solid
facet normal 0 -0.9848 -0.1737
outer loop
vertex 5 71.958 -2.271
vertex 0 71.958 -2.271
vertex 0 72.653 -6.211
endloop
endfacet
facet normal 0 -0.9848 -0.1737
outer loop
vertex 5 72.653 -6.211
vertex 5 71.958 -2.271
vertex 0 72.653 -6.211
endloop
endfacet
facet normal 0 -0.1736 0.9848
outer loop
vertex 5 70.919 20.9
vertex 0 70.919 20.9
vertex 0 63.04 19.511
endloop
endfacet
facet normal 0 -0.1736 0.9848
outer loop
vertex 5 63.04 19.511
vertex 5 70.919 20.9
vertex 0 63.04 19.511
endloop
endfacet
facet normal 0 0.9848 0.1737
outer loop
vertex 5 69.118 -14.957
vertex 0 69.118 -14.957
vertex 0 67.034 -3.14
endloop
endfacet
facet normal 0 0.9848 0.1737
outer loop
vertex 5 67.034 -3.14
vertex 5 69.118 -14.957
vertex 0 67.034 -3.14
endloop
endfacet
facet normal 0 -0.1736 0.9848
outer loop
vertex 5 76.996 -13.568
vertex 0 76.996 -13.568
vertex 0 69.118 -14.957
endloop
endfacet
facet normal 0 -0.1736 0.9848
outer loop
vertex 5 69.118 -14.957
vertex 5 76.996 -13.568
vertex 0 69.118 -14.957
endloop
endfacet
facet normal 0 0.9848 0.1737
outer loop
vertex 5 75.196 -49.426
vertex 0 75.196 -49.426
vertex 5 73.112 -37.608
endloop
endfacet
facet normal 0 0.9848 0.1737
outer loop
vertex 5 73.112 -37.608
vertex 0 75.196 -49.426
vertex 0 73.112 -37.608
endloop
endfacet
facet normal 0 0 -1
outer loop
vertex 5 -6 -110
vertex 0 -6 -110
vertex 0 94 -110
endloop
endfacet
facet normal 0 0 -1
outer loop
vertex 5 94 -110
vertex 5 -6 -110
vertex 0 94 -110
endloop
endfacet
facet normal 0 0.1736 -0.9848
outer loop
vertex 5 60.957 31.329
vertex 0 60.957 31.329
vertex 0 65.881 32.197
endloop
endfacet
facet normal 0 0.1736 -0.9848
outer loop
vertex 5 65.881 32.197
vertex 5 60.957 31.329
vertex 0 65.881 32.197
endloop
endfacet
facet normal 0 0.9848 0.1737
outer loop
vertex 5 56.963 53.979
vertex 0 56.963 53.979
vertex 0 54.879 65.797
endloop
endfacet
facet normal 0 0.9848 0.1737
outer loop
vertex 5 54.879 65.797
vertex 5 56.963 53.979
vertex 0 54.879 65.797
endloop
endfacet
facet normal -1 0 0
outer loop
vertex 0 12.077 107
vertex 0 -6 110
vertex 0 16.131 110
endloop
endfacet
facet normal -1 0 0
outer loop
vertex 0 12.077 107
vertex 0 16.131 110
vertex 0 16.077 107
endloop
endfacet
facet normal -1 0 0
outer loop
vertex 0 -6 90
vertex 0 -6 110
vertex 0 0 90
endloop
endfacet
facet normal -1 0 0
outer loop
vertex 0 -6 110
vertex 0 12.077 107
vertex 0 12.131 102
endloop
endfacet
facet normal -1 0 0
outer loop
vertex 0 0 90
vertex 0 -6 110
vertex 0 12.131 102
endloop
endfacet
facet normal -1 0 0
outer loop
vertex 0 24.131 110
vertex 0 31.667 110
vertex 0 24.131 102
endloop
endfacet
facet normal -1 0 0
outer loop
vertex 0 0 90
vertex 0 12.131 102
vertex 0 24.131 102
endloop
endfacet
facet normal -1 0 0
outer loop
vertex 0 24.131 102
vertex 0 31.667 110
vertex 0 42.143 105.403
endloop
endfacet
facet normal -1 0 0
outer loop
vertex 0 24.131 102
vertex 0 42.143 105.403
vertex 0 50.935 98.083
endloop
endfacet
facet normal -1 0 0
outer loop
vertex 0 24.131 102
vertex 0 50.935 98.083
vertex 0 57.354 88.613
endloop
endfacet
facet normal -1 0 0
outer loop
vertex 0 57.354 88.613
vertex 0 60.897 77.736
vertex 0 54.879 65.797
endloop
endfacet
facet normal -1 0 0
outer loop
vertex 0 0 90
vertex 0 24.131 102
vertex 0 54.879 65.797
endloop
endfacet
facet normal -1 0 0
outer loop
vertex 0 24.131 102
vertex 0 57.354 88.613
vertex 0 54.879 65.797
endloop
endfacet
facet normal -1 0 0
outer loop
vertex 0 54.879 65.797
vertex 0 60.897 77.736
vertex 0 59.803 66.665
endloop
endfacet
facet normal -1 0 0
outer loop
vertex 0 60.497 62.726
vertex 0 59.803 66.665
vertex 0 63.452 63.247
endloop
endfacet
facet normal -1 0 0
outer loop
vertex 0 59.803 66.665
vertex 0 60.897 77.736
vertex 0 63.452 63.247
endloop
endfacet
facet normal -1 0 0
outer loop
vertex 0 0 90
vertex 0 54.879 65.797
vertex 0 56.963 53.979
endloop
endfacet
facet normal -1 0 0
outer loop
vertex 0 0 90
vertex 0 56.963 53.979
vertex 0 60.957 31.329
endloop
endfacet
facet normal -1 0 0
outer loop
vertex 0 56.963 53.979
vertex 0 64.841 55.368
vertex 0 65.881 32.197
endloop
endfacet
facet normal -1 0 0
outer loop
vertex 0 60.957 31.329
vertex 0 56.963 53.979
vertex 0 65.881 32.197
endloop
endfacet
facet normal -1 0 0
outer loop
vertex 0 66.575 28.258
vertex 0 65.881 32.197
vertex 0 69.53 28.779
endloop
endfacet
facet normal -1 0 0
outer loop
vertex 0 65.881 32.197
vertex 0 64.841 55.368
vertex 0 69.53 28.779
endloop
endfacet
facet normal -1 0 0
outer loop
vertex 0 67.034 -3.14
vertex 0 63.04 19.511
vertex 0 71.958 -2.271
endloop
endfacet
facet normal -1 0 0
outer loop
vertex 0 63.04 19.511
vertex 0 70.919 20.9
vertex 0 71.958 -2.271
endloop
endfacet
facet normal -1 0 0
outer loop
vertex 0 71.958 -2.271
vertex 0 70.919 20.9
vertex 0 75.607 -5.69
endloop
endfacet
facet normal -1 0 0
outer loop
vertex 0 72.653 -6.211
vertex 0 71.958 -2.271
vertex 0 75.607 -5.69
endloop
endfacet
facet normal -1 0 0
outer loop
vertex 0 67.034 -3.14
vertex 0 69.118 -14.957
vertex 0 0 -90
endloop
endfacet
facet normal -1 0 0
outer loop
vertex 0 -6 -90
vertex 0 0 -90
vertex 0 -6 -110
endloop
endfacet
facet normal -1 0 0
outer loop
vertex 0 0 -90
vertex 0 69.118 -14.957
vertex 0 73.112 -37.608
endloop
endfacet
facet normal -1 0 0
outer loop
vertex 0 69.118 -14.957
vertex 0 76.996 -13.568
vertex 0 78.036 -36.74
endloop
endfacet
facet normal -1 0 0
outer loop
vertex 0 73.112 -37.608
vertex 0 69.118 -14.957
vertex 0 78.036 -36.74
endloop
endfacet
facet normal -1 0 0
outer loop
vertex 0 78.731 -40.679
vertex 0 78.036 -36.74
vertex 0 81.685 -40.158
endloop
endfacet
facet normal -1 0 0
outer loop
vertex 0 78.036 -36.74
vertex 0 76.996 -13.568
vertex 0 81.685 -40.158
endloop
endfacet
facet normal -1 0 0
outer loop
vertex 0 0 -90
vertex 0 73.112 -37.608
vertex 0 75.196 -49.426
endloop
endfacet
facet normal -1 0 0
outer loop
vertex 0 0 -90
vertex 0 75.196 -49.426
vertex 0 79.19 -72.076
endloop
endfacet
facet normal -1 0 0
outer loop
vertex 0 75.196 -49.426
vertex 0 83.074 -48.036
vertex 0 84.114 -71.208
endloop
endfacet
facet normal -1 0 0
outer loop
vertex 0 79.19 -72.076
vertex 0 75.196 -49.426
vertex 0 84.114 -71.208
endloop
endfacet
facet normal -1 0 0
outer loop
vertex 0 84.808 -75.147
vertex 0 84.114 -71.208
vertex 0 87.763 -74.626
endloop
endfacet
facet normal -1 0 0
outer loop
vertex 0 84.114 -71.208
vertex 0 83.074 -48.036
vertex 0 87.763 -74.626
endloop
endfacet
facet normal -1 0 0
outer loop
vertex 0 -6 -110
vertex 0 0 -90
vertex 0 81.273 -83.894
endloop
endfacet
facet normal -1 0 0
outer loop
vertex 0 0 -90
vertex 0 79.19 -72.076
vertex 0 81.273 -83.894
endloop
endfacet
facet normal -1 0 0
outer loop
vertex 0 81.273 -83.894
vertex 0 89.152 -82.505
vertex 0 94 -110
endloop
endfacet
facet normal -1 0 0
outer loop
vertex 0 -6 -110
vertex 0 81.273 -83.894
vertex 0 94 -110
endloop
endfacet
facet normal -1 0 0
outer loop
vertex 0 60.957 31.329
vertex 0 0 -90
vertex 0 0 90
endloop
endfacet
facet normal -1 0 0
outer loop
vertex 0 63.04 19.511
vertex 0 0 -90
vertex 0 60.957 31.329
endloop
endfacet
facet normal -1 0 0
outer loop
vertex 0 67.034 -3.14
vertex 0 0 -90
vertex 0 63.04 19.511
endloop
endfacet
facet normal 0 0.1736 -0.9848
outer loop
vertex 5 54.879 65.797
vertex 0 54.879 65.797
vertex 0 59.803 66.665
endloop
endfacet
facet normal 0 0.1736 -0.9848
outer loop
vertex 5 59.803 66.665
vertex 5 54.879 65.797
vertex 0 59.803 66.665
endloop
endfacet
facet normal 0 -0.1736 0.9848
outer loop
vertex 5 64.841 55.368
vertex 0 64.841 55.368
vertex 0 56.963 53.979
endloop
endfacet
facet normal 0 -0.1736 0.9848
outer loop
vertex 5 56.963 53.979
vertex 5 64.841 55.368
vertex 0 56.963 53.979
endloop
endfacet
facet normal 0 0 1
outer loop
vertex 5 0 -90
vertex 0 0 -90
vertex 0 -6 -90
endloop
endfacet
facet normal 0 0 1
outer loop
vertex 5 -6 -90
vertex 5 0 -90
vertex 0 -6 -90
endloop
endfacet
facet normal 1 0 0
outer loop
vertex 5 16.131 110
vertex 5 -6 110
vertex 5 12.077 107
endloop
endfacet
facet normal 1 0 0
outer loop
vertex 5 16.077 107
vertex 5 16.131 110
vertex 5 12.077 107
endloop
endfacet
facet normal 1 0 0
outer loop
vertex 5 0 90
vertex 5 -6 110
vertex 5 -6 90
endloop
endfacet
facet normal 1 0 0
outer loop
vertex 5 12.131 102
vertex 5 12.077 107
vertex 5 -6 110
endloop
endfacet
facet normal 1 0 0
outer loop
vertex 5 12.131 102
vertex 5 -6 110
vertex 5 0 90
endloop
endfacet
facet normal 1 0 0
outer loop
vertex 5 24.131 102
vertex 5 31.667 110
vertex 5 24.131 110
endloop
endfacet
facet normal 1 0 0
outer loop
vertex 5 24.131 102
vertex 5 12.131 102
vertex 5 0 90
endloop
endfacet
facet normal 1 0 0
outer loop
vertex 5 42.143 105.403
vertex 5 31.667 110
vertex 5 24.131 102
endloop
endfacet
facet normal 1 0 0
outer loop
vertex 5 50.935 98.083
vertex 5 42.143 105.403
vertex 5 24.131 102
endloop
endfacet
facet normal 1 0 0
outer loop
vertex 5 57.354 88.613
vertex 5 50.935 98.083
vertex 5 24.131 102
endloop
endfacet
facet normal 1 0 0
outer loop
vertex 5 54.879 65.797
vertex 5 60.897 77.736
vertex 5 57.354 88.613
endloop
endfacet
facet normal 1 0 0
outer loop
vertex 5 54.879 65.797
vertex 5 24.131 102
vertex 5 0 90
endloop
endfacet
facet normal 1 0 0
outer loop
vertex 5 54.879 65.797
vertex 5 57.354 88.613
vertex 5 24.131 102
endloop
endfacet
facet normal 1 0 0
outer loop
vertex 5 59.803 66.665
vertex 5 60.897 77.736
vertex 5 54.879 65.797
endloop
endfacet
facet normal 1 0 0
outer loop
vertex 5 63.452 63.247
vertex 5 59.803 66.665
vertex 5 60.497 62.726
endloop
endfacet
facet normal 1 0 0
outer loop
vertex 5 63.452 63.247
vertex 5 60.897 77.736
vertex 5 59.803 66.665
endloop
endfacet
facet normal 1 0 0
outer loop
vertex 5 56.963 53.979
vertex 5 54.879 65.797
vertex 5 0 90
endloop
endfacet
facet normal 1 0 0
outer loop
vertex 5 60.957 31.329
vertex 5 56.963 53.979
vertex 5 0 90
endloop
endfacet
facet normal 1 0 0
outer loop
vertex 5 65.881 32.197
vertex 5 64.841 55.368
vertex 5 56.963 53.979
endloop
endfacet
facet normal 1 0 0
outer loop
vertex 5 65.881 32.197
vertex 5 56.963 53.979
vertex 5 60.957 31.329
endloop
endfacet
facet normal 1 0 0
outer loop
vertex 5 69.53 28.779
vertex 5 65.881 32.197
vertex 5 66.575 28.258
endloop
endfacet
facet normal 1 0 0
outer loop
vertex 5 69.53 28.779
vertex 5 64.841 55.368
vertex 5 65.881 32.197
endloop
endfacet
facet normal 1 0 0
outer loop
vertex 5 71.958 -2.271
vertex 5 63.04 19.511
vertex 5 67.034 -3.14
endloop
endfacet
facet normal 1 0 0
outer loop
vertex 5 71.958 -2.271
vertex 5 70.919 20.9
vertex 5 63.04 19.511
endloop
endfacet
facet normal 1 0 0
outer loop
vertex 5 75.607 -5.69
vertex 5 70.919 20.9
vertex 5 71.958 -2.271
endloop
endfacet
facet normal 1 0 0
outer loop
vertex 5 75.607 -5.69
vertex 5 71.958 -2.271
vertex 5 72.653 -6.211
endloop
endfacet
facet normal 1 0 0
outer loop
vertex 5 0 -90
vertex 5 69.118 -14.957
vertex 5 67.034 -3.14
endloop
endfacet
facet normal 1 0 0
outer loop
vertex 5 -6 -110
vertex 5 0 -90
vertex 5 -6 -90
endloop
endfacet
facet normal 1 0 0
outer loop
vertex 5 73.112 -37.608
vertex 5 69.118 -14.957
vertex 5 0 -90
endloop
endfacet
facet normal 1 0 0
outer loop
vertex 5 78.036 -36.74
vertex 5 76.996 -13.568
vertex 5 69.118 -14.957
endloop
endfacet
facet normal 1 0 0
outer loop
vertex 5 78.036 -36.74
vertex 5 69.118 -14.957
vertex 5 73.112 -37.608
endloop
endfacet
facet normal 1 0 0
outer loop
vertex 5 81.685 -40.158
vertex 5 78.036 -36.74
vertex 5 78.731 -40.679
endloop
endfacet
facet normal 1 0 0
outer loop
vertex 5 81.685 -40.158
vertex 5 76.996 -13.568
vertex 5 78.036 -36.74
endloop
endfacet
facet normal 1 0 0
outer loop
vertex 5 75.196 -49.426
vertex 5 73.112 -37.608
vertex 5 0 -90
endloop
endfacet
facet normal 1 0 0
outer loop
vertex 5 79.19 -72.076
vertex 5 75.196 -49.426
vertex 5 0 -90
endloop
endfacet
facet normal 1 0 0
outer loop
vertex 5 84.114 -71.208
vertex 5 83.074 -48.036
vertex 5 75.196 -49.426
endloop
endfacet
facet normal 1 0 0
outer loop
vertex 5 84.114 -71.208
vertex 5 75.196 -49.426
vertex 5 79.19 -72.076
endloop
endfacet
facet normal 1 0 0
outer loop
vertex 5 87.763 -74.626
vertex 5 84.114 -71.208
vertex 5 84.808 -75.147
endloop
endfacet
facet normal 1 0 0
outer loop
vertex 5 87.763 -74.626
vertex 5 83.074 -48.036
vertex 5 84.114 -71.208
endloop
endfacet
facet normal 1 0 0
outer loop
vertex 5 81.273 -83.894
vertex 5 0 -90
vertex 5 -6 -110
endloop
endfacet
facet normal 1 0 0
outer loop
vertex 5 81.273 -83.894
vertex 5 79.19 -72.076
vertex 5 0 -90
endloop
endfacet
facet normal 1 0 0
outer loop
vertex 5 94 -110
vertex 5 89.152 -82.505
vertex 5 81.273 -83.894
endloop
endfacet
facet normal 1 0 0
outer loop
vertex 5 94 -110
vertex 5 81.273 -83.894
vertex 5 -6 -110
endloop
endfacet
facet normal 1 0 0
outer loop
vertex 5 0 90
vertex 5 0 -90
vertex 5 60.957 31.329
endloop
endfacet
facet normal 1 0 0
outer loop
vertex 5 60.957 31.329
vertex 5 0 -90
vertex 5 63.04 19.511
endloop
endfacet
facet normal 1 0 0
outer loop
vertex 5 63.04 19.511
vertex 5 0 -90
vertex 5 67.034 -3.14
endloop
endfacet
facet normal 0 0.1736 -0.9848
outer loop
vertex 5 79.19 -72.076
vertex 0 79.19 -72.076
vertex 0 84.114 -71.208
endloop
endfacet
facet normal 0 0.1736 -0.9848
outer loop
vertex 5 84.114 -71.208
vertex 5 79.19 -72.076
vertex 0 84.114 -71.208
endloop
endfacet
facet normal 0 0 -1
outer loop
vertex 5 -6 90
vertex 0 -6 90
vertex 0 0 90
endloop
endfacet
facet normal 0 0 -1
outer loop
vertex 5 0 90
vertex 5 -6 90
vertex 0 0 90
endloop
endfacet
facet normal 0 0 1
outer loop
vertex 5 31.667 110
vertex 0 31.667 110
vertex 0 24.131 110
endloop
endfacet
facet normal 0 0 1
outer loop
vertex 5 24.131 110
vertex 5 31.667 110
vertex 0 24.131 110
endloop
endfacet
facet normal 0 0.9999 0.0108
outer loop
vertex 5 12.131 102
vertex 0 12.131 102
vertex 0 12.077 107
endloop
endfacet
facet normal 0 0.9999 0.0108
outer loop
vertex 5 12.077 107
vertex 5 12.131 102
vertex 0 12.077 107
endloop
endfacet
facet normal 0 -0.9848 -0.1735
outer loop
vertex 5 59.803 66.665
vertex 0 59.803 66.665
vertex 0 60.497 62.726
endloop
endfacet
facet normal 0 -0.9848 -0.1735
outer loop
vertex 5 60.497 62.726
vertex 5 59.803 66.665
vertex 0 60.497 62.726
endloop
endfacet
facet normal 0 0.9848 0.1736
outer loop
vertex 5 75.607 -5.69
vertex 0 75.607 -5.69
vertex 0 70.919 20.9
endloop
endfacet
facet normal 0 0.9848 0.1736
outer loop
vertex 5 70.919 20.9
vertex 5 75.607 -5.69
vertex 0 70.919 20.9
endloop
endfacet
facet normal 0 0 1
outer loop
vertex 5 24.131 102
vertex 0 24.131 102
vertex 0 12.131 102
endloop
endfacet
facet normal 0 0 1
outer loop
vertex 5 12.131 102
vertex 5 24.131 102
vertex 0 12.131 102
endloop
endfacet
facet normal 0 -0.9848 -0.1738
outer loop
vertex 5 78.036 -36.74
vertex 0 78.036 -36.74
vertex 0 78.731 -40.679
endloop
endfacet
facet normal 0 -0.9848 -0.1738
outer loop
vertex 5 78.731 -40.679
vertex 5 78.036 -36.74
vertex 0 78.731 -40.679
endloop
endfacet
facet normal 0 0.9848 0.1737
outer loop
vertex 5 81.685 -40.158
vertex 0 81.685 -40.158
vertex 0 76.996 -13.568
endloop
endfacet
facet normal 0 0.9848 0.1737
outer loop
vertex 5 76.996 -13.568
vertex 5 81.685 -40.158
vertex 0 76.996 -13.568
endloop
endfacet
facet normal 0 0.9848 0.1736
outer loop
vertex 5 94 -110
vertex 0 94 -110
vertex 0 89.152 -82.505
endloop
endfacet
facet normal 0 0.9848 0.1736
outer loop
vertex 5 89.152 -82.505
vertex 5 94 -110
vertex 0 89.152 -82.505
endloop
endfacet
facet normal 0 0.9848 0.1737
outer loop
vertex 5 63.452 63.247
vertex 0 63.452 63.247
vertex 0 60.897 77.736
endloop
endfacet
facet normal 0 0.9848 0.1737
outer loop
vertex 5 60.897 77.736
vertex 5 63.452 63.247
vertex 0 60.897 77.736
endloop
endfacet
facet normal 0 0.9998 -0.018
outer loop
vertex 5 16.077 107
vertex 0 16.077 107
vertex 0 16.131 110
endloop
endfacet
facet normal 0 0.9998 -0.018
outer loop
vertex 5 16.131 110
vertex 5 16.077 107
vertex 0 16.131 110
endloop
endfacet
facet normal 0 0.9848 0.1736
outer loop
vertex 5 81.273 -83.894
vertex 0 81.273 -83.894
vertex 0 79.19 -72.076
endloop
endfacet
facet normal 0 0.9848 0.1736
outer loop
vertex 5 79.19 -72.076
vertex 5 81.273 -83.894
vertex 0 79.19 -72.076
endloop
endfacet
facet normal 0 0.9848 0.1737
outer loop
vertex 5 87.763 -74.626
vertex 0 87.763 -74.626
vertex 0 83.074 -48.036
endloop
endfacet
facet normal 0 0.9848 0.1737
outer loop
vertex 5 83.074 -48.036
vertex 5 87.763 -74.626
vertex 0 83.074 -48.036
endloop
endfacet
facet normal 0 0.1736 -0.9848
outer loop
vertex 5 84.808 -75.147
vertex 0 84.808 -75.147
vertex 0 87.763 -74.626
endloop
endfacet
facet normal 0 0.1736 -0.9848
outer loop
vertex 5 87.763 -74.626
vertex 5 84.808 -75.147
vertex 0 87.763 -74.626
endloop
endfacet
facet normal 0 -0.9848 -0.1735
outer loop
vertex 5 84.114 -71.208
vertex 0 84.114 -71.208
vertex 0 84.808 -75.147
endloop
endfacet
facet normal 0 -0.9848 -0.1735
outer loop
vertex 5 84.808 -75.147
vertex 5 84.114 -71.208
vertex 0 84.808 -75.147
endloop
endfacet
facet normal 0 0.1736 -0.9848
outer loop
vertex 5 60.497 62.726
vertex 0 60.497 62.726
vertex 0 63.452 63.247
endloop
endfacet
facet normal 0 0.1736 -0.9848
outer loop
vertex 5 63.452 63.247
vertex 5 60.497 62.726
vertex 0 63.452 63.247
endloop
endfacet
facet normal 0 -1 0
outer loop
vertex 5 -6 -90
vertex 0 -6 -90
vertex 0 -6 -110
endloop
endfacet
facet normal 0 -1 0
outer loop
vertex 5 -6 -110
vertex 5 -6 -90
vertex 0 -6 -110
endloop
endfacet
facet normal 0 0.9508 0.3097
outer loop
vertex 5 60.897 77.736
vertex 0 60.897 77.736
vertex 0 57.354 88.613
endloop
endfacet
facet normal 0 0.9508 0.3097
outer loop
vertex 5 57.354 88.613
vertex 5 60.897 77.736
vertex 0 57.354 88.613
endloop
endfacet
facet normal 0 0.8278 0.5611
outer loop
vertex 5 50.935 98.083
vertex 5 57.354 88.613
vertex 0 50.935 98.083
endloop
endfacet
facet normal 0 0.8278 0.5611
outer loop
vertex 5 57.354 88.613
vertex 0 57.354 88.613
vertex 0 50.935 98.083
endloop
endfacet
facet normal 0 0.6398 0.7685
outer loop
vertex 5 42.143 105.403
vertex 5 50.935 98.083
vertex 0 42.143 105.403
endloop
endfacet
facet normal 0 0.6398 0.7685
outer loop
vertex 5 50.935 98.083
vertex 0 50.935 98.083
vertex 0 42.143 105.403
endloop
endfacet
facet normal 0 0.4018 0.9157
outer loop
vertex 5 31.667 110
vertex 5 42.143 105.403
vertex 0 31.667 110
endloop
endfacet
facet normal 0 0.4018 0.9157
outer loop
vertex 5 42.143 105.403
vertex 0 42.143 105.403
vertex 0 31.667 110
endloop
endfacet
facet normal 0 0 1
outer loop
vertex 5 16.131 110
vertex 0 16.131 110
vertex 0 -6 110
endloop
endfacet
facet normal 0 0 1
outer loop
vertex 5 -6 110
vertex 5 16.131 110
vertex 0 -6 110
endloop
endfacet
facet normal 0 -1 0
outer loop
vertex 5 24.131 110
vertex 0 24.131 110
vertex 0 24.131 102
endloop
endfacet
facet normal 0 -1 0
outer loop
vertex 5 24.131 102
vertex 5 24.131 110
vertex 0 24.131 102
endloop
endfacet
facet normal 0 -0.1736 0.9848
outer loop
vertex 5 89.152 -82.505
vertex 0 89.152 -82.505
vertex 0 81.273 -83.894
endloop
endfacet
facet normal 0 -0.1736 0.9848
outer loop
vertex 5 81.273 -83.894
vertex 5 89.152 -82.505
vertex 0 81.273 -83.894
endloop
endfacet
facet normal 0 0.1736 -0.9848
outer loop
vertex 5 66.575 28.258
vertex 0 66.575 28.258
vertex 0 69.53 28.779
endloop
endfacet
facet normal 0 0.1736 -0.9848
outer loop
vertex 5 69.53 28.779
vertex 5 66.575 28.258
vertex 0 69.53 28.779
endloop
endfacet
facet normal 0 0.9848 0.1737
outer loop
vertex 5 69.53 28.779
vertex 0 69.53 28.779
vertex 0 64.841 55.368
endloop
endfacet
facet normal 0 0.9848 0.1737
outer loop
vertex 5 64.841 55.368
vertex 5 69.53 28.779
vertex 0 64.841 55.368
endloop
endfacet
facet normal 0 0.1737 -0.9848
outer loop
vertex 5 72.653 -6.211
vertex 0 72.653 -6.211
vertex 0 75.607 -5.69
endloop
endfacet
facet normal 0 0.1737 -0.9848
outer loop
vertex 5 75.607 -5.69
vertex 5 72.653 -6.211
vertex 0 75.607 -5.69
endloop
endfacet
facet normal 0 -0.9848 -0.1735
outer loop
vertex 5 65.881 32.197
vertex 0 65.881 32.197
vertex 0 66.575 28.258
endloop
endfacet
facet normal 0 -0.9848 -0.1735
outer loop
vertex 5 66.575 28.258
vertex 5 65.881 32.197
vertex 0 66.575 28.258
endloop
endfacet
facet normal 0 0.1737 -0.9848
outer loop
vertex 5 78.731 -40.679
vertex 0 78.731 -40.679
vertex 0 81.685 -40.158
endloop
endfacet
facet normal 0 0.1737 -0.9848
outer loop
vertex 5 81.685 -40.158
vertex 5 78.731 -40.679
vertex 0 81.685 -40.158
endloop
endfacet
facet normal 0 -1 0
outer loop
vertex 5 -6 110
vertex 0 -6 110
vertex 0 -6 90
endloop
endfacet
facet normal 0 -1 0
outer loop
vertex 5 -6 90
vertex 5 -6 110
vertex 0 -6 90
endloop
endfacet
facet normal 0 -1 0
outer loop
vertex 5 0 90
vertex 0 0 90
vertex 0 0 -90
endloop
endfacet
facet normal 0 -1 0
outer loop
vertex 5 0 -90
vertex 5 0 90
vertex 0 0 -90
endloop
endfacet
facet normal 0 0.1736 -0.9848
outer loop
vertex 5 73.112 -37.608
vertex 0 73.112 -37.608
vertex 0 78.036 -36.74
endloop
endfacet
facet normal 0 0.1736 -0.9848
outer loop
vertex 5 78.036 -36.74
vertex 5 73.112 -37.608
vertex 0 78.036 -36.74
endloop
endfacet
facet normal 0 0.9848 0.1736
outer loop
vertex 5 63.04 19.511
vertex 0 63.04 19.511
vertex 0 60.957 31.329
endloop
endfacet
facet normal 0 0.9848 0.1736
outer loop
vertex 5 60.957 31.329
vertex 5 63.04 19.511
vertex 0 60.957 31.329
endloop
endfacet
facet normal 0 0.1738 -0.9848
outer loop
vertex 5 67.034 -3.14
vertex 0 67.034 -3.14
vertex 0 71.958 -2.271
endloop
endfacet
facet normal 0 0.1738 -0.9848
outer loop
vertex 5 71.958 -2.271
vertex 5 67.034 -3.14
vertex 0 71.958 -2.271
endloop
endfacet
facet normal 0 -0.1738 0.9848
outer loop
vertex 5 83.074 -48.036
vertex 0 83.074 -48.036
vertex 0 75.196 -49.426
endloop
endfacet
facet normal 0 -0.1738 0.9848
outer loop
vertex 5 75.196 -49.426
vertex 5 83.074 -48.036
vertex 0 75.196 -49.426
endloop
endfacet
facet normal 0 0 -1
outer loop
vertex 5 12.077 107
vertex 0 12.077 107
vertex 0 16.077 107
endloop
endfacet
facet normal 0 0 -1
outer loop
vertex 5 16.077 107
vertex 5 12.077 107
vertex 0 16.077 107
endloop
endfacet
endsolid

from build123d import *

# Parameters (mm, degrees)
BOSS_EXTRUDE1_DEPTH = 5


with BuildPart() as part:
    # Sketch1 → Boss-Extrude1 (new body)
    with BuildSketch(Plane(origin=(0, 0, 0), x_dir=(0, 0, -1), z_dir=(1, 0, 0))):
        with BuildLine():
            Line((-110, -6), (-90, -6))
            Line((-90, -6), (-90, 0))
            Line((-90, 0), (90, 0))
            Line((90, 0), (90, -6))
            Line((90, -6), (110, -6))
            Line((110, -6), (110, 94))
            Line((110, 94), (82.504621365, 89.151822902))
            Line((82.504621365, 89.151822902), (83.893806786, 81.273360878))
            Line((83.893806786, 81.273360878), (72.07611375, 79.189582746))
            Line((72.07611375, 79.189582746), (71.207872862, 84.113621511))
            Line((71.207872862, 84.113621511), (75.147103874, 84.808214222))
            Line((75.147103874, 84.808214222), (74.626159341, 87.762637481))
            Line((74.626159341, 87.762637481), (48.03635001, 83.074136684))
            Line((48.03635001, 83.074136684), (49.425535431, 75.195674659))
            Line((49.425535431, 75.195674659), (37.607842395, 73.111896527))
            Line((37.607842395, 73.111896527), (36.739601507, 78.035935292))
            Line((36.739601507, 78.035935292), (40.678832519, 78.730528003))
            Line((40.678832519, 78.730528003), (40.157887986, 81.684951262))
            Line((40.157887986, 81.684951262), (13.568078654, 76.996450465))
            Line((13.568078654, 76.996450465), (14.957264076, 69.117988441))
            Line((14.957264076, 69.117988441), (3.139571039, 67.034210309))
            Line((3.139571039, 67.034210309), (2.271330151, 71.958249074))
            Line((2.271330151, 71.958249074), (6.210561163, 72.652841785))
            Line((6.210561163, 72.652841785), (5.68961663, 75.607265044))
            Line((5.68961663, 75.607265044), (-20.900192701, 70.918764247))
            Line((-20.900192701, 70.918764247), (-19.51100728, 63.040302223))
            Line((-19.51100728, 63.040302223), (-31.328700316, 60.956524091))
            Line((-31.328700316, 60.956524091), (-32.196941204, 65.880562856))
            Line((-32.196941204, 65.880562856), (-28.257710192, 66.575155566))
            Line((-28.257710192, 66.575155566), (-28.778654725, 69.529578826))
            Line((-28.778654725, 69.529578826), (-55.368464057, 64.841078029))
            Line((-55.368464057, 64.841078029), (-53.979278635, 56.962616004))
            Line((-53.979278635, 56.962616004), (-65.796971671, 54.878837872))
            Line((-65.796971671, 54.878837872), (-66.66521256, 59.802876637))
            Line((-66.66521256, 59.802876637), (-62.725981548, 60.497469348))
            Line((-62.725981548, 60.497469348), (-63.246926081, 63.451892607))
            Line((-63.246926081, 63.451892607), (-77.735825896, 60.897108649))
            ThreePointArc((-77.735825896, 60.897108649), (-98.082925814, 50.934591362), (-110, 31.66701319))
            Line((-110, 31.66701319), (-110, 24.130960335))
            Line((-110, 24.130960335), (-102, 24.130960335))
            Line((-102, 24.130960335), (-102, 12.130960335))
            Line((-102, 12.130960335), (-106.999710258, 12.07713347))
            Line((-106.999710258, 12.07713347), (-107.000482929, 16.077133396))
            Line((-107.000482929, 16.077133396), (-110, 16.130960335))
            Line((-110, 16.130960335), (-110, -6))
        make_face()
    extrude(amount=BOSS_EXTRUDE1_DEPTH)


solid = part.part
